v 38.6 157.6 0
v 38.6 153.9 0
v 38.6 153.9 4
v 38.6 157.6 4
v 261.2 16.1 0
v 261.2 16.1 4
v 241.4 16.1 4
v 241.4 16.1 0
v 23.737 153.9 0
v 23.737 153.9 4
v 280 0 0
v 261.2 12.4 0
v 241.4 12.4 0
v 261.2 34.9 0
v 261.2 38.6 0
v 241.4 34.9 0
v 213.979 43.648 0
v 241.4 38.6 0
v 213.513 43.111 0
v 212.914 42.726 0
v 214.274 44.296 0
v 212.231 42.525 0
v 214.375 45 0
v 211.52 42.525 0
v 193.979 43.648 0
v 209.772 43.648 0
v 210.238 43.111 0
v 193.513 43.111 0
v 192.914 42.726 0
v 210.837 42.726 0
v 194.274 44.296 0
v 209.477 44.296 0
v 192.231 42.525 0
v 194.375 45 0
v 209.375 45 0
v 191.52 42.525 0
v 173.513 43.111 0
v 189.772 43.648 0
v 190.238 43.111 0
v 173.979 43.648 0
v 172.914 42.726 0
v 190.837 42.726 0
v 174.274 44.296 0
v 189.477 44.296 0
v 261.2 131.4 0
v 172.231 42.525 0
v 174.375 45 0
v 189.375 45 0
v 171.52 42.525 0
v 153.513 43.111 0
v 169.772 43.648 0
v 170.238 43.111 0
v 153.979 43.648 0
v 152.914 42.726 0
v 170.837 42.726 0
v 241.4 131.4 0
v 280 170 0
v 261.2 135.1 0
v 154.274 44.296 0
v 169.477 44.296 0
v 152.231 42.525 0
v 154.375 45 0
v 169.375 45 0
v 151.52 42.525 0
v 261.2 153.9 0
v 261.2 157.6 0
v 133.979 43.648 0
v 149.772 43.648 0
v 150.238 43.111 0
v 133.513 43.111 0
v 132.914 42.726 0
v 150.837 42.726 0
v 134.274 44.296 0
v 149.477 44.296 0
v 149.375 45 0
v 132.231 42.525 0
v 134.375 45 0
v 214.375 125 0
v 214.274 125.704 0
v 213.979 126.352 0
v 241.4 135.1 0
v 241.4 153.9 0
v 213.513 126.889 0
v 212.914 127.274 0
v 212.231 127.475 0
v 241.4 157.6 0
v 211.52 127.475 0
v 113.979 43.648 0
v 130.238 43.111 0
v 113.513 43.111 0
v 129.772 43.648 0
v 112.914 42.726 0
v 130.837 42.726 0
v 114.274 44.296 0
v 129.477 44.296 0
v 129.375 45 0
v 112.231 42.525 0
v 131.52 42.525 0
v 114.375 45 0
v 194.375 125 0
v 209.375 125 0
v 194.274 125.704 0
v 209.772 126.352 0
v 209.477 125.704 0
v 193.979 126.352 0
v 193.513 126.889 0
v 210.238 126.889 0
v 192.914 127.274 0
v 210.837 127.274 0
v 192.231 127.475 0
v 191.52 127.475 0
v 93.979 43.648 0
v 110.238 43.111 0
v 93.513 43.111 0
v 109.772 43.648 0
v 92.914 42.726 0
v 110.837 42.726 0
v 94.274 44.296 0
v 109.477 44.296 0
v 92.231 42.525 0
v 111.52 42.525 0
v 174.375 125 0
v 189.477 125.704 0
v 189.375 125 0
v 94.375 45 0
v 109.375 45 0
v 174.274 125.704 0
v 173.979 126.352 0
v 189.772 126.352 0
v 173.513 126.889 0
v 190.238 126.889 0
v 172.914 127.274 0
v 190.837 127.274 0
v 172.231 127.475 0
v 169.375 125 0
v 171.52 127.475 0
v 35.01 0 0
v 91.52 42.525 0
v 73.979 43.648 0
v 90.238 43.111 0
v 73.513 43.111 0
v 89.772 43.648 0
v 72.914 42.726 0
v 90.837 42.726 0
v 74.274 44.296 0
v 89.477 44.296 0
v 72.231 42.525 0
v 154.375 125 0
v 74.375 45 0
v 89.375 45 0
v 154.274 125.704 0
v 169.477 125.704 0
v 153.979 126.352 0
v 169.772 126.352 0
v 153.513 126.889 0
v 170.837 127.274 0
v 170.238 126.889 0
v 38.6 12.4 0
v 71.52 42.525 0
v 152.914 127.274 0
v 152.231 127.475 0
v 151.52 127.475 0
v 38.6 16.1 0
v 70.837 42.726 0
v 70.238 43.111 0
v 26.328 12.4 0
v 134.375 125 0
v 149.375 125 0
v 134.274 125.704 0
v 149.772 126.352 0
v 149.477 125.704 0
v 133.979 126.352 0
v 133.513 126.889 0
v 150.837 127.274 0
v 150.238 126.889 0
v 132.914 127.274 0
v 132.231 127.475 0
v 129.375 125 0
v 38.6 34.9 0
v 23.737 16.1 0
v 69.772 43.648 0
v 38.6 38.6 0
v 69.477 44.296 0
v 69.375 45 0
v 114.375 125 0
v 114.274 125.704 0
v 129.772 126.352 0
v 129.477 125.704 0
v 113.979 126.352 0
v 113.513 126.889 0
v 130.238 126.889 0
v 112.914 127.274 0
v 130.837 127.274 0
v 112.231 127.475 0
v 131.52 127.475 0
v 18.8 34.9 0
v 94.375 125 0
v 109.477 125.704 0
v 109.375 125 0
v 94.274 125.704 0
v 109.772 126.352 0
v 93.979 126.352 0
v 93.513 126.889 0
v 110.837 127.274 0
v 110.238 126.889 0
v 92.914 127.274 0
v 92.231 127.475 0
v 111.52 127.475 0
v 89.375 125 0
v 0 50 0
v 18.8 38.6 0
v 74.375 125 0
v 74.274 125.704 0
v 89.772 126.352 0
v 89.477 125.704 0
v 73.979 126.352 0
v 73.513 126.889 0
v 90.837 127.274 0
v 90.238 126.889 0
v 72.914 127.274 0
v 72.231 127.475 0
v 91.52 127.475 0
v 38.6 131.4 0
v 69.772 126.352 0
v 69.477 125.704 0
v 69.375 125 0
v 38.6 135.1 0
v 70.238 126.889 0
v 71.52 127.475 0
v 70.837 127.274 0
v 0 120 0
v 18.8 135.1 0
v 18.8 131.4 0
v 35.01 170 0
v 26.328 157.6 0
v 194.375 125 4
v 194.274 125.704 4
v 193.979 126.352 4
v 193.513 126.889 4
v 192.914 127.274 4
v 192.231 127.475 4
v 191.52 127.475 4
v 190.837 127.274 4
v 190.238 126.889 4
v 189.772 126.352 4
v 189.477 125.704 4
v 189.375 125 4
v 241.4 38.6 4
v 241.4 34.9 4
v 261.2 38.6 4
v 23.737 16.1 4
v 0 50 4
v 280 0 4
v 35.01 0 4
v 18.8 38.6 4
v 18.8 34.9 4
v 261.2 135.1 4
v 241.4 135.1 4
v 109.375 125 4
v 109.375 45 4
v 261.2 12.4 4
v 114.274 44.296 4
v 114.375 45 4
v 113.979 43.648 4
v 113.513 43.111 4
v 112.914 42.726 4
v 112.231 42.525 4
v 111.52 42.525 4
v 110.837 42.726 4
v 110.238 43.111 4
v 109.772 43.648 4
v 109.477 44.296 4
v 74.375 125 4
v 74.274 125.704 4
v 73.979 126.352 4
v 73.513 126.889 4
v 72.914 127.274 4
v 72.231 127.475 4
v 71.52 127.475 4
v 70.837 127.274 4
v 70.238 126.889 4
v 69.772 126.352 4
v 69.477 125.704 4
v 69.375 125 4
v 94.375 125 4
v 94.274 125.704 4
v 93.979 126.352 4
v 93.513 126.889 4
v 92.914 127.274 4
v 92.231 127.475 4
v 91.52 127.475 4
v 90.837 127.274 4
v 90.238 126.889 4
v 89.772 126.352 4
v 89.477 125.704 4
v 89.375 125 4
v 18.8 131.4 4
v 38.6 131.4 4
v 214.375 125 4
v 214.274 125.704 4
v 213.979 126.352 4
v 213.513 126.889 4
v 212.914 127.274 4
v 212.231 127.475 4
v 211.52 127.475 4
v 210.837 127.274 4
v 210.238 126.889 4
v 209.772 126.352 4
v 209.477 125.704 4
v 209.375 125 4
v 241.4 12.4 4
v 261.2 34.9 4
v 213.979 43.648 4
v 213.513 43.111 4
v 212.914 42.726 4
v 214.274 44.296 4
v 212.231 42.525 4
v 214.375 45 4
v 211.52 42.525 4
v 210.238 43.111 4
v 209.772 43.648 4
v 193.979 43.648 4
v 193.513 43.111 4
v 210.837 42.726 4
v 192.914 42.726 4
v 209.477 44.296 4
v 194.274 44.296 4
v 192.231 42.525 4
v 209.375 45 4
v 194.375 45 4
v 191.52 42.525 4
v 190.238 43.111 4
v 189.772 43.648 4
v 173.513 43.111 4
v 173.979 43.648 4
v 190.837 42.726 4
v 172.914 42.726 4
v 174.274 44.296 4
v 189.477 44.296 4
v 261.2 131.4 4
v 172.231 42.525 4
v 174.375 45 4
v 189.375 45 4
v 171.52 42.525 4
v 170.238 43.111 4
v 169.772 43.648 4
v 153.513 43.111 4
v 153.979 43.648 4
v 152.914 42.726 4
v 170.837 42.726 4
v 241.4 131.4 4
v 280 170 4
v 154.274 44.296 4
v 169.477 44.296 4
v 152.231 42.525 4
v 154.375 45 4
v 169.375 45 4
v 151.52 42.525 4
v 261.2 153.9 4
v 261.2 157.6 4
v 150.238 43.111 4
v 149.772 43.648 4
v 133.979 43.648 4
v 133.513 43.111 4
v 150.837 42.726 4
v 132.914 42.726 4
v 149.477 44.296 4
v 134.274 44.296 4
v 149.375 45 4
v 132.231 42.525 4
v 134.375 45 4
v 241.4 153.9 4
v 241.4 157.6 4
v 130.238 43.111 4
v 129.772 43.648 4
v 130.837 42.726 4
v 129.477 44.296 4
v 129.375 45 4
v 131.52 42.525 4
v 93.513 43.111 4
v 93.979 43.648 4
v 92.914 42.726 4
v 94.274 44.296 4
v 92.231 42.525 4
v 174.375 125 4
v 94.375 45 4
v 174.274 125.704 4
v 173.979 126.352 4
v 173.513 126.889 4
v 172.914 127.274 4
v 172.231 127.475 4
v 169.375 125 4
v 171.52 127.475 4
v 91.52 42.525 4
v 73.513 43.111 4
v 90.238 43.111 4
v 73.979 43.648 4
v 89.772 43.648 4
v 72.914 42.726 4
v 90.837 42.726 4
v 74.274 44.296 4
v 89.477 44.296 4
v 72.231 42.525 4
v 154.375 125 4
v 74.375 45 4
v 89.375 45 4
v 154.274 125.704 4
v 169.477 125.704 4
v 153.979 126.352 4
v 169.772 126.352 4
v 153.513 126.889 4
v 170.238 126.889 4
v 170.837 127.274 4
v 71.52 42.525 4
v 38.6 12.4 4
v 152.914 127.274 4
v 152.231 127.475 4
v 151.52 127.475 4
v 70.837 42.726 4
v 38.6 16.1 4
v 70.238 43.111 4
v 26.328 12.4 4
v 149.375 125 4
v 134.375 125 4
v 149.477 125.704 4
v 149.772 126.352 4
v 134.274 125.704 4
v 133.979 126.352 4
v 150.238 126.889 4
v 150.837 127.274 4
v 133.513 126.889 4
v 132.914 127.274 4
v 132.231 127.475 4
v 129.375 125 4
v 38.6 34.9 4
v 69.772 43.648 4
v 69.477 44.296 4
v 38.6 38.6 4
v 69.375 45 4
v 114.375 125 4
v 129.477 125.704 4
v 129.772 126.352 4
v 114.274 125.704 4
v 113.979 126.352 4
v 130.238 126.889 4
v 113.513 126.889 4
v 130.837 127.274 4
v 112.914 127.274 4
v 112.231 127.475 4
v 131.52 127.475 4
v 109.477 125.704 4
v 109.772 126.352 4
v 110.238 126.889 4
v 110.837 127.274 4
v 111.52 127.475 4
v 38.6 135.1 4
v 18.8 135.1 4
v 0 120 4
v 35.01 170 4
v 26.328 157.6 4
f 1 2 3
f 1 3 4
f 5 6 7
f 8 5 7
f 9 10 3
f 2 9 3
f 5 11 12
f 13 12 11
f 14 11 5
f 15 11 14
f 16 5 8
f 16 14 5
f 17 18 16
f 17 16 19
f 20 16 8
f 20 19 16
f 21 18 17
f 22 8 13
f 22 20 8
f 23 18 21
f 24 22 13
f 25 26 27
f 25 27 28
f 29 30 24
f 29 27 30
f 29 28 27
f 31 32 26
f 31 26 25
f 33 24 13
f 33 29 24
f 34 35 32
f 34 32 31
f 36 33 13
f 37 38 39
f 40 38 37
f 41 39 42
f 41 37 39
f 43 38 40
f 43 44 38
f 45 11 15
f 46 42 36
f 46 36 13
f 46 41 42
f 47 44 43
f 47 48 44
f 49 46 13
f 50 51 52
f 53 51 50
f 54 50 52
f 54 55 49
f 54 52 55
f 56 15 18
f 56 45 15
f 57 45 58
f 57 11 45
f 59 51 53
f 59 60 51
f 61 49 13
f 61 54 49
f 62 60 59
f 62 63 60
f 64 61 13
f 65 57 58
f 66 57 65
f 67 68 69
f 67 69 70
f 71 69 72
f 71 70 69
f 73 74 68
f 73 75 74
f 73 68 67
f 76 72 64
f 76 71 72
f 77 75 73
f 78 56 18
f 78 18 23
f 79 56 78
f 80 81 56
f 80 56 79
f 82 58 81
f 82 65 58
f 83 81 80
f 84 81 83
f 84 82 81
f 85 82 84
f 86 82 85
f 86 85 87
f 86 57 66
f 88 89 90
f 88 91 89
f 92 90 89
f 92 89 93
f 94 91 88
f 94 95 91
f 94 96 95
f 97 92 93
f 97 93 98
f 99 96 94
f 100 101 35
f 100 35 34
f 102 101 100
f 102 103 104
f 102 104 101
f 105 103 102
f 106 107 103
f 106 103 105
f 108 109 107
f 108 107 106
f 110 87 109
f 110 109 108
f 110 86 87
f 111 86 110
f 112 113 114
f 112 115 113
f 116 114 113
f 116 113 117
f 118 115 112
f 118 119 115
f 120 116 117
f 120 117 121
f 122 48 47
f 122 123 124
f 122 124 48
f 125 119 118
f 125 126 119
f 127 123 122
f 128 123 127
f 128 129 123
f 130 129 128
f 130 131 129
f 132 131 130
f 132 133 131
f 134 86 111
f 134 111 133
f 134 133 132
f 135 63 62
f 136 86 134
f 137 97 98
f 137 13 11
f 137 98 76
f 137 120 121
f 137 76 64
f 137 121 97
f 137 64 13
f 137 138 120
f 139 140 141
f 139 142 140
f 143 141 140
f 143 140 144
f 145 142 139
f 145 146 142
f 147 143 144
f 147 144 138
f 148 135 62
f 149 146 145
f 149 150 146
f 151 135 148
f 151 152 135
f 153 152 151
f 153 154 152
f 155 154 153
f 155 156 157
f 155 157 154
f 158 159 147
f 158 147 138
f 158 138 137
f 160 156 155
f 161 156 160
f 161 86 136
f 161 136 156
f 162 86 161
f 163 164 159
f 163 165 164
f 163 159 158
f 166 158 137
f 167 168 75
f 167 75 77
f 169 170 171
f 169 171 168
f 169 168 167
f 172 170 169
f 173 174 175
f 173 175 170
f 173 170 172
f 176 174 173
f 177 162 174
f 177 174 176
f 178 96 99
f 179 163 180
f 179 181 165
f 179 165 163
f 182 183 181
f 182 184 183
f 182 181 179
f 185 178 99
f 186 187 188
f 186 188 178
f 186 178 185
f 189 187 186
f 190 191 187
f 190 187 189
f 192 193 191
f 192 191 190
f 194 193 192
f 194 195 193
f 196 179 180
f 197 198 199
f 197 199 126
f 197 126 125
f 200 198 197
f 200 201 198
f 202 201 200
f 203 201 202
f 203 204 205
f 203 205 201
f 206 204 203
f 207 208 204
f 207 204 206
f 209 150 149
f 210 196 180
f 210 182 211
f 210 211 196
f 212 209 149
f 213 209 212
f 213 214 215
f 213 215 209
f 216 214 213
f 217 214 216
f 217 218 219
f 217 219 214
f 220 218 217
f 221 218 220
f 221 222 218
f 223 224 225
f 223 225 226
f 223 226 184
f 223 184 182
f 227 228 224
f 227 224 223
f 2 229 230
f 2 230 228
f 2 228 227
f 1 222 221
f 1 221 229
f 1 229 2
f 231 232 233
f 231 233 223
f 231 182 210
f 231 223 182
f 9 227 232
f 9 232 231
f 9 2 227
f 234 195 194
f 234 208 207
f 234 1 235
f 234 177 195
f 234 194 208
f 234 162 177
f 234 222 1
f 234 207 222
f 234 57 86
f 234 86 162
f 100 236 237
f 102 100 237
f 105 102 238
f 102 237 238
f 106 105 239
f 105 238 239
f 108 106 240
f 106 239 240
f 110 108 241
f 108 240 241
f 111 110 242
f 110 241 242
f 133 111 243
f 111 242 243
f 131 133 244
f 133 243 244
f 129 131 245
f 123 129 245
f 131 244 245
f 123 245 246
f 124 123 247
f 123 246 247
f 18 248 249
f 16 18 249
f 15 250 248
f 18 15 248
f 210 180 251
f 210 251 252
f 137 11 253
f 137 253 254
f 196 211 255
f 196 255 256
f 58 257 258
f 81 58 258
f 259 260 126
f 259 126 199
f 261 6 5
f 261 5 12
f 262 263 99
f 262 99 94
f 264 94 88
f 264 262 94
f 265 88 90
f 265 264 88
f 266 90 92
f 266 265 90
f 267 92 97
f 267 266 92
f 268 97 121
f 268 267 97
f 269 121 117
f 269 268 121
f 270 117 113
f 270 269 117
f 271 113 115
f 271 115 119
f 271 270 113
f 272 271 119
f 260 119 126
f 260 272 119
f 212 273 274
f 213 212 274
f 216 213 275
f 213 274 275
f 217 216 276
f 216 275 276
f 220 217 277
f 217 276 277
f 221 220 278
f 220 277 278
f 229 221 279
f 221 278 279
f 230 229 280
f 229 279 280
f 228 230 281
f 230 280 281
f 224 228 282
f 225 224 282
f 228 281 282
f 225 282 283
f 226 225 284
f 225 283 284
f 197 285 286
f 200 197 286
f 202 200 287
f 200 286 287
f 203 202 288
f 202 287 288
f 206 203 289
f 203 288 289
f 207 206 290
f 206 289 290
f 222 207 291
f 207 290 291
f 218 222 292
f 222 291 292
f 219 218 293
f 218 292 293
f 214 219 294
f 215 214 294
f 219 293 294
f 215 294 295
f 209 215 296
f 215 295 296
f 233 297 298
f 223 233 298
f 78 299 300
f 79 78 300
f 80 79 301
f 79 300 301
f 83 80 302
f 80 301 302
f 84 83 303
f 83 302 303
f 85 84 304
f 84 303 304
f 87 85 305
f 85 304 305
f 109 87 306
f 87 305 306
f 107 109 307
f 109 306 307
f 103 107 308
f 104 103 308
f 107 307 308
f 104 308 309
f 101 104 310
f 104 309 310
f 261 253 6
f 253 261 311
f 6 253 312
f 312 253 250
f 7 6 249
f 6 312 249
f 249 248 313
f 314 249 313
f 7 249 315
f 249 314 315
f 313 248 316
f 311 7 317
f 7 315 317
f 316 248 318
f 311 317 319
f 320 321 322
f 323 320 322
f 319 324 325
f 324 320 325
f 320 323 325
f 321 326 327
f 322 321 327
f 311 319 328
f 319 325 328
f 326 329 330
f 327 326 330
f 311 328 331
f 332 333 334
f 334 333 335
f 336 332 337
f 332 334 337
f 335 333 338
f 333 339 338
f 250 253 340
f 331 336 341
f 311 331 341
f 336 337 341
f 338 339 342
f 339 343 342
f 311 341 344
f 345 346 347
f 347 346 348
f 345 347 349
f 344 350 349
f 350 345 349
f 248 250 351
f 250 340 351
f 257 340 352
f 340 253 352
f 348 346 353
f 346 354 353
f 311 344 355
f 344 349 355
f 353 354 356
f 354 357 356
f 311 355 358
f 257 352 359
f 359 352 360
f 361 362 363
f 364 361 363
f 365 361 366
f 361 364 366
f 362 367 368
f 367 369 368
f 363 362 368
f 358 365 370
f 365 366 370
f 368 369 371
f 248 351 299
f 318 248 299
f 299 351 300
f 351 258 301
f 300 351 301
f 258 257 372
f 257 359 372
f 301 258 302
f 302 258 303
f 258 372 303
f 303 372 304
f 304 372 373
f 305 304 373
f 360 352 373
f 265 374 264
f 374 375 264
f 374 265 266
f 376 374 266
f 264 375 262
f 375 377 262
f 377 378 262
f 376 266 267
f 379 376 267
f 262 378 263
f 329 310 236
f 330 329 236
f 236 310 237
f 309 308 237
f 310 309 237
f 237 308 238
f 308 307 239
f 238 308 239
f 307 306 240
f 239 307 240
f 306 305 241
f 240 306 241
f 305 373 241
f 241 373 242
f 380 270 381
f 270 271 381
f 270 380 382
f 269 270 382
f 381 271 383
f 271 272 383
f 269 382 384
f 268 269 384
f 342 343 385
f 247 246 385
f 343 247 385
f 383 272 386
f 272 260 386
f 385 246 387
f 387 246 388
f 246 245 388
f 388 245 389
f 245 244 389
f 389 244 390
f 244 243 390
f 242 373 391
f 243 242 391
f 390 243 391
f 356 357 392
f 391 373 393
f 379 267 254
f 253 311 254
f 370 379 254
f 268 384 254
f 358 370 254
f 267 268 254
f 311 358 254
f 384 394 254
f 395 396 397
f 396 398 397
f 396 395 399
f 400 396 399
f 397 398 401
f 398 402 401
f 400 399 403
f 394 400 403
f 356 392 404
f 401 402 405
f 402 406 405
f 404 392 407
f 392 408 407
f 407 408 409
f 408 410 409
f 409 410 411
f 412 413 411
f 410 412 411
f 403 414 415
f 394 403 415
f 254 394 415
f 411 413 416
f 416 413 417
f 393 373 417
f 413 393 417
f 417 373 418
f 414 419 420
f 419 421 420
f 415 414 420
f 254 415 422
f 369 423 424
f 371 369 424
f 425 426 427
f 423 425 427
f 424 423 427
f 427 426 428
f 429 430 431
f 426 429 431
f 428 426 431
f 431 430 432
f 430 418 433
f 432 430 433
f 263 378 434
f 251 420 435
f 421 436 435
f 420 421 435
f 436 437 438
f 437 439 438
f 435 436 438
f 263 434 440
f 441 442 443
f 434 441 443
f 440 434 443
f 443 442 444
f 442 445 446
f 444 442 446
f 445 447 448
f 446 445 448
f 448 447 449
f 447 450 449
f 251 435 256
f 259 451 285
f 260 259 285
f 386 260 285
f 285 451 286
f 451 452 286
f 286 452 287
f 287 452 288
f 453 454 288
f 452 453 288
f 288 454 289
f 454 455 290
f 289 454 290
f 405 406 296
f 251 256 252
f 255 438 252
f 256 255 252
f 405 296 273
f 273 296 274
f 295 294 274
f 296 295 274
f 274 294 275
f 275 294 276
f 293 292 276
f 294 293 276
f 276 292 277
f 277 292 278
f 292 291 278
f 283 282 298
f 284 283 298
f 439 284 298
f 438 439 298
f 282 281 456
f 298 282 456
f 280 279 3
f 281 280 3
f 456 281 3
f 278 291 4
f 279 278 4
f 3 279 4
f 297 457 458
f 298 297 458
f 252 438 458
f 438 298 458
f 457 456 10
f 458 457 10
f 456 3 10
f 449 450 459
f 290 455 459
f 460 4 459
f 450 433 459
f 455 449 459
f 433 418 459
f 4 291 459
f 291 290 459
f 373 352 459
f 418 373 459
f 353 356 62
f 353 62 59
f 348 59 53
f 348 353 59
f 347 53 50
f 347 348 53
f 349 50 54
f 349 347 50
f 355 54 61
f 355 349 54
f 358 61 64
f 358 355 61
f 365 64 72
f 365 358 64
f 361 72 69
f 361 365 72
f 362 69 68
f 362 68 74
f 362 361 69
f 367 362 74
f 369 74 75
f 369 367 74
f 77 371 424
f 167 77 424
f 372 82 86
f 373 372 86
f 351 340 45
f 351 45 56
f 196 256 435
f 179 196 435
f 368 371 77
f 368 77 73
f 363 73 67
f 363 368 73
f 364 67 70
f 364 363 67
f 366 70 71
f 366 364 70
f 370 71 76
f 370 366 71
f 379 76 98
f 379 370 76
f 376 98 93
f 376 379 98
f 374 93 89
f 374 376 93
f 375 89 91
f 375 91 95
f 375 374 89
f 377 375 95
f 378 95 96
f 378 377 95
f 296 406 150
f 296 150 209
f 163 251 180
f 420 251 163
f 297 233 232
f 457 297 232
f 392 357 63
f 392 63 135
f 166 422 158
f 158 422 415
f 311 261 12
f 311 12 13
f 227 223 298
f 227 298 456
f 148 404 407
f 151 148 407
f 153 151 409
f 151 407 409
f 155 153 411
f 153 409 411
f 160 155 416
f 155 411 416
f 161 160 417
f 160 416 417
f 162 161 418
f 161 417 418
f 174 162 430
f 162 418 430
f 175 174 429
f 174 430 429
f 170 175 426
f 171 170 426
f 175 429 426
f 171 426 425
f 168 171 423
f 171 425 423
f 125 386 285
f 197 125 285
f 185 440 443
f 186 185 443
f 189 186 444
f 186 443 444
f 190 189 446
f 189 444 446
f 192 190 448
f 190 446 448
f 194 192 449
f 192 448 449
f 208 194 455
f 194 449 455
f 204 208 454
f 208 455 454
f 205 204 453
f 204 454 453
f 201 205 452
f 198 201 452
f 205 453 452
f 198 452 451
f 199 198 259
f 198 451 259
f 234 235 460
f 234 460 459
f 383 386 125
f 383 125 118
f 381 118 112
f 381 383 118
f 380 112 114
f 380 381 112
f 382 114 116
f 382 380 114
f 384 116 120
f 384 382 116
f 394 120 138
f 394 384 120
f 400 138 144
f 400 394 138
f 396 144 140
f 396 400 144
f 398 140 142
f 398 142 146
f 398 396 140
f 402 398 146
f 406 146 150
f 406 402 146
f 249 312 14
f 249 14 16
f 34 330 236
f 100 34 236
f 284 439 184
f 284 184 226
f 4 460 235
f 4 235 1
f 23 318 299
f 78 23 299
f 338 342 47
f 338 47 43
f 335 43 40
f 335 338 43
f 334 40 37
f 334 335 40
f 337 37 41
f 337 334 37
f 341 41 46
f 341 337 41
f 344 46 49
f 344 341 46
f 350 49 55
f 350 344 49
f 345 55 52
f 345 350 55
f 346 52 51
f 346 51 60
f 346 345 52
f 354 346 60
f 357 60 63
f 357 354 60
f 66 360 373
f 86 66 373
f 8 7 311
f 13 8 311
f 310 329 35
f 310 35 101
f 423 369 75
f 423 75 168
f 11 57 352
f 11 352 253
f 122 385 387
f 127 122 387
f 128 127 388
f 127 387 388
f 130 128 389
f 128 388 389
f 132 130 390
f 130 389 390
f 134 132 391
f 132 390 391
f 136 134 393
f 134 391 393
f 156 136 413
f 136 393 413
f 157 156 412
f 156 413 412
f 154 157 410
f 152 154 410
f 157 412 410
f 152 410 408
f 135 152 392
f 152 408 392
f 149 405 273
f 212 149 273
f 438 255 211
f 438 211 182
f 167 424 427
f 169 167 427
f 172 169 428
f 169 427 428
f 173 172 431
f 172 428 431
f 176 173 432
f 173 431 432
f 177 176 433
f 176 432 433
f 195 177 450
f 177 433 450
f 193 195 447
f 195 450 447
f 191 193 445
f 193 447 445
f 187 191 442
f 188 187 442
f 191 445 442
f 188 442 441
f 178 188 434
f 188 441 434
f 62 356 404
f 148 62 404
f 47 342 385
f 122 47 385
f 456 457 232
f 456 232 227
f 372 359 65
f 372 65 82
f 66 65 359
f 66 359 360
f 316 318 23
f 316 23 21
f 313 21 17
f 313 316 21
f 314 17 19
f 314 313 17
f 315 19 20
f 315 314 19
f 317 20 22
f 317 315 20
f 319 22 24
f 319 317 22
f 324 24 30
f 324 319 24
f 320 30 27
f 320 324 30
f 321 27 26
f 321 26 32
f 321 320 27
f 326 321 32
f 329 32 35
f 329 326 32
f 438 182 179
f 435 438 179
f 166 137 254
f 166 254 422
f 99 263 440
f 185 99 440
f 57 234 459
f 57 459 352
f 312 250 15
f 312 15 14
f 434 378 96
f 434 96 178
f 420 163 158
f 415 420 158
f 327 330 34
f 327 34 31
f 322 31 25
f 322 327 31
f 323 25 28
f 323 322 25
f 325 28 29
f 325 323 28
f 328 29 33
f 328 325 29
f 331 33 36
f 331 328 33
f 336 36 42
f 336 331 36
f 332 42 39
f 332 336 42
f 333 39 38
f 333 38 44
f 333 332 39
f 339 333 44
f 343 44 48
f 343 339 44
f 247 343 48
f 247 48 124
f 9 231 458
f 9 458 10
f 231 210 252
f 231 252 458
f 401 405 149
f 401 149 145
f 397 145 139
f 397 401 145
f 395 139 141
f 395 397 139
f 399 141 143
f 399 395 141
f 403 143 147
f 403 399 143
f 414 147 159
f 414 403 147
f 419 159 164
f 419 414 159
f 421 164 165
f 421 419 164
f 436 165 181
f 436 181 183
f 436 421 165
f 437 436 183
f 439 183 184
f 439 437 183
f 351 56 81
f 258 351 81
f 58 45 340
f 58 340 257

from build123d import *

# Parameters (mm, degrees)
AUFSATZ_LINEAR_AUSTRAGEN1_DEPTH = 4
SKIZZE2_W                       = 19.8
SKIZZE2_H                       = 3.7
SCHNITT_LINEAR_AUSTRAGEN1_DEPTH = 4
SPIEGELN2_COPY_1_SKETCH_W       = 19.8
SPIEGELN2_COPY_1_SKETCH_H       = 3.7
SPIEGELN2_COPY_1_DEPTH          = 4
SCHNITT_LINEAR_AUSTRAGEN2_DEPTH = 4
LINEARES_MUSTER1_COUNT          = 8
LINEARES_MUSTER1_PITCH          = 20
LINEARES_MUSTER1_COPY_1_DEPTH   = 4
LINEARES_MUSTER1_COPY_2_DEPTH   = 4
LINEARES_MUSTER1_COPY_3_DEPTH   = 4
LINEARES_MUSTER1_COPY_4_DEPTH   = 4
LINEARES_MUSTER1_COPY_5_DEPTH   = 4
LINEARES_MUSTER1_COPY_6_DEPTH   = 4
LINEARES_MUSTER1_COPY_7_DEPTH   = 4


with BuildPart() as part:
    # Skizze1 → Aufsatz-Linear austragen1 (new body)
    with BuildSketch(Plane.XY):
        Polygon((35.01037691, 0), (0, 50), (0, 120), (35.01037691, 170), (280, 170), (280, 0), align=None)
    extrude(amount=AUFSATZ_LINEAR_AUSTRAGEN1_DEPTH)

    # Skizze2 → Schnitt-Linear austragen1 (cut)
    with BuildSketch(Plane.XY.offset(4)):
        with Locations((28.7, 155.75)):
            Rectangle(SKIZZE2_W, SKIZZE2_H)
        with Locations((28.7, 133.25)):
            Rectangle(SKIZZE2_W, SKIZZE2_H)
    schnitt_linear_austragen1 = extrude(amount=-SCHNITT_LINEAR_AUSTRAGEN1_DEPTH, mode=Mode.SUBTRACT)

    # Spiegeln1: Schnitt-Linear austragen1 across plane
    add(schnitt_linear_austragen1.mirror(Plane.ZX.offset(85)), mode=Mode.SUBTRACT)

    # Spiegeln2: Schnitt-Linear austragen1 across plane
    add(schnitt_linear_austragen1.mirror(Plane.ZY.offset(-140)), mode=Mode.SUBTRACT)

    # Spiegeln2 copy 1 sketch → Spiegeln2 copy 1 (cut)
    with BuildSketch(Plane(origin=(280, 170, 4), x_dir=(-1, 0, 0), z_dir=(0, 0, 1))):
        with Locations((28.7, 155.75)):
            Rectangle(SPIEGELN2_COPY_1_SKETCH_W, SPIEGELN2_COPY_1_SKETCH_H)
        with Locations((28.7, 133.25)):
            Rectangle(SPIEGELN2_COPY_1_SKETCH_W, SPIEGELN2_COPY_1_SKETCH_H)
    extrude(amount=-SPIEGELN2_COPY_1_DEPTH, mode=Mode.SUBTRACT)

    # Skizze4 → Schnitt-Linear austragen2 (cut)
    with BuildSketch(Plane.XY.offset(4)):
        with BuildLine():
            Line((69.37540934, 85), (74.37540934, 85))
            Line((74.37540934, 85), (74.37540934, 125))
            ThreePointArc((74.37540934, 125), (71.87540934, 127.5), (69.37540934, 125))
            Line((69.37540934, 125), (69.37540934, 85))
        make_face()
    schnitt_linear_austragen2 = extrude(amount=-SCHNITT_LINEAR_AUSTRAGEN2_DEPTH, mode=Mode.SUBTRACT)

    # Spiegeln3: Schnitt-Linear austragen2 across plane
    add(schnitt_linear_austragen2.mirror(Plane.ZX.offset(85)), mode=Mode.SUBTRACT)

    # Lineares Muster1: Schnitt-Linear austragen2 ×8
    with Locations(*[(i * LINEARES_MUSTER1_PITCH, 0, 0) for i in range(1, LINEARES_MUSTER1_COUNT)]):
        add(schnitt_linear_austragen2, mode=Mode.SUBTRACT)

    # Lineares Muster1 copy 1 sketch → Lineares Muster1 copy 1 (cut)
    with BuildSketch(Plane(origin=(20, 170, 4), x_dir=(1, 0, 0), z_dir=(0, 0, 1))):
        with BuildLine():
            Line((69.37540934, -85), (74.37540934, -85))
            Line((74.37540934, -85), (74.37540934, -125))
            ThreePointArc((74.37540934, -125), (71.87540934, -127.5), (69.37540934, -125))
            Line((69.37540934, -125), (69.37540934, -85))
        make_face()
    extrude(amount=-LINEARES_MUSTER1_COPY_1_DEPTH, mode=Mode.SUBTRACT)

    # Lineares Muster1 copy 2 sketch → Lineares Muster1 copy 2 (cut)
    with BuildSketch(Plane(origin=(40, 170, 4), x_dir=(1, 0, 0), z_dir=(0, 0, 1))):
        with BuildLine():
            Line((69.37540934, -85), (74.37540934, -85))
            Line((74.37540934, -85), (74.37540934, -125))
            ThreePointArc((74.37540934, -125), (71.87540934, -127.5), (69.37540934, -125))
            Line((69.37540934, -125), (69.37540934, -85))
        make_face()
    extrude(amount=-LINEARES_MUSTER1_COPY_2_DEPTH, mode=Mode.SUBTRACT)

    # Lineares Muster1 copy 3 sketch → Lineares Muster1 copy 3 (cut)
    with BuildSketch(Plane(origin=(60, 170, 4), x_dir=(1, 0, 0), z_dir=(0, 0, 1))):
        with BuildLine():
            Line((69.37540934, -85), (74.37540934, -85))
            Line((74.37540934, -85), (74.37540934, -125))
            ThreePointArc((74.37540934, -125), (71.87540934, -127.5), (69.37540934, -125))
            Line((69.37540934, -125), (69.37540934, -85))
        make_face()
    extrude(amount=-LINEARES_MUSTER1_COPY_3_DEPTH, mode=Mode.SUBTRACT)

    # Lineares Muster1 copy 4 sketch → Lineares Muster1 copy 4 (cut)
    with BuildSketch(Plane(origin=(80, 170, 4), x_dir=(1, 0, 0), z_dir=(0, 0, 1))):
        with BuildLine():
            Line((69.37540934, -85), (74.37540934, -85))
            Line((74.37540934, -85), (74.37540934, -125))
            ThreePointArc((74.37540934, -125), (71.87540934, -127.5), (69.37540934, -125))
            Line((69.37540934, -125), (69.37540934, -85))
        make_face()
    extrude(amount=-LINEARES_MUSTER1_COPY_4_DEPTH, mode=Mode.SUBTRACT)

    # Lineares Muster1 copy 5 sketch → Lineares Muster1 copy 5 (cut)
    with BuildSketch(Plane(origin=(100, 170, 4), x_dir=(1, 0, 0), z_dir=(0, 0, 1))):
        with BuildLine():
            Line((69.37540934, -85), (74.37540934, -85))
            Line((74.37540934, -85), (74.37540934, -125))
            ThreePointArc((74.37540934, -125), (71.87540934, -127.5), (69.37540934, -125))
            Line((69.37540934, -125), (69.37540934, -85))
        make_face()
    extrude(amount=-LINEARES_MUSTER1_COPY_5_DEPTH, mode=Mode.SUBTRACT)

    # Lineares Muster1 copy 6 sketch → Lineares Muster1 copy 6 (cut)
    with BuildSketch(Plane(origin=(120, 170, 4), x_dir=(1, 0, 0), z_dir=(0, 0, 1))):
        with BuildLine():
            Line((69.37540934, -85), (74.37540934, -85))
            Line((74.37540934, -85), (74.37540934, -125))
            ThreePointArc((74.37540934, -125), (71.87540934, -127.5), (69.37540934, -125))
            Line((69.37540934, -125), (69.37540934, -85))
        make_face()
    extrude(amount=-LINEARES_MUSTER1_COPY_6_DEPTH, mode=Mode.SUBTRACT)

    # Lineares Muster1 copy 7 sketch → Lineares Muster1 copy 7 (cut)
    with BuildSketch(Plane(origin=(140, 170, 4), x_dir=(1, 0, 0), z_dir=(0, 0, 1))):
        with BuildLine():
            Line((69.37540934, -85), (74.37540934, -85))
            Line((74.37540934, -85), (74.37540934, -125))
            ThreePointArc((74.37540934, -125), (71.87540934, -127.5), (69.37540934, -125))
            Line((69.37540934, -125), (69.37540934, -85))
        make_face()
    extrude(amount=-LINEARES_MUSTER1_COPY_7_DEPTH, mode=Mode.SUBTRACT)


solid = part.part
